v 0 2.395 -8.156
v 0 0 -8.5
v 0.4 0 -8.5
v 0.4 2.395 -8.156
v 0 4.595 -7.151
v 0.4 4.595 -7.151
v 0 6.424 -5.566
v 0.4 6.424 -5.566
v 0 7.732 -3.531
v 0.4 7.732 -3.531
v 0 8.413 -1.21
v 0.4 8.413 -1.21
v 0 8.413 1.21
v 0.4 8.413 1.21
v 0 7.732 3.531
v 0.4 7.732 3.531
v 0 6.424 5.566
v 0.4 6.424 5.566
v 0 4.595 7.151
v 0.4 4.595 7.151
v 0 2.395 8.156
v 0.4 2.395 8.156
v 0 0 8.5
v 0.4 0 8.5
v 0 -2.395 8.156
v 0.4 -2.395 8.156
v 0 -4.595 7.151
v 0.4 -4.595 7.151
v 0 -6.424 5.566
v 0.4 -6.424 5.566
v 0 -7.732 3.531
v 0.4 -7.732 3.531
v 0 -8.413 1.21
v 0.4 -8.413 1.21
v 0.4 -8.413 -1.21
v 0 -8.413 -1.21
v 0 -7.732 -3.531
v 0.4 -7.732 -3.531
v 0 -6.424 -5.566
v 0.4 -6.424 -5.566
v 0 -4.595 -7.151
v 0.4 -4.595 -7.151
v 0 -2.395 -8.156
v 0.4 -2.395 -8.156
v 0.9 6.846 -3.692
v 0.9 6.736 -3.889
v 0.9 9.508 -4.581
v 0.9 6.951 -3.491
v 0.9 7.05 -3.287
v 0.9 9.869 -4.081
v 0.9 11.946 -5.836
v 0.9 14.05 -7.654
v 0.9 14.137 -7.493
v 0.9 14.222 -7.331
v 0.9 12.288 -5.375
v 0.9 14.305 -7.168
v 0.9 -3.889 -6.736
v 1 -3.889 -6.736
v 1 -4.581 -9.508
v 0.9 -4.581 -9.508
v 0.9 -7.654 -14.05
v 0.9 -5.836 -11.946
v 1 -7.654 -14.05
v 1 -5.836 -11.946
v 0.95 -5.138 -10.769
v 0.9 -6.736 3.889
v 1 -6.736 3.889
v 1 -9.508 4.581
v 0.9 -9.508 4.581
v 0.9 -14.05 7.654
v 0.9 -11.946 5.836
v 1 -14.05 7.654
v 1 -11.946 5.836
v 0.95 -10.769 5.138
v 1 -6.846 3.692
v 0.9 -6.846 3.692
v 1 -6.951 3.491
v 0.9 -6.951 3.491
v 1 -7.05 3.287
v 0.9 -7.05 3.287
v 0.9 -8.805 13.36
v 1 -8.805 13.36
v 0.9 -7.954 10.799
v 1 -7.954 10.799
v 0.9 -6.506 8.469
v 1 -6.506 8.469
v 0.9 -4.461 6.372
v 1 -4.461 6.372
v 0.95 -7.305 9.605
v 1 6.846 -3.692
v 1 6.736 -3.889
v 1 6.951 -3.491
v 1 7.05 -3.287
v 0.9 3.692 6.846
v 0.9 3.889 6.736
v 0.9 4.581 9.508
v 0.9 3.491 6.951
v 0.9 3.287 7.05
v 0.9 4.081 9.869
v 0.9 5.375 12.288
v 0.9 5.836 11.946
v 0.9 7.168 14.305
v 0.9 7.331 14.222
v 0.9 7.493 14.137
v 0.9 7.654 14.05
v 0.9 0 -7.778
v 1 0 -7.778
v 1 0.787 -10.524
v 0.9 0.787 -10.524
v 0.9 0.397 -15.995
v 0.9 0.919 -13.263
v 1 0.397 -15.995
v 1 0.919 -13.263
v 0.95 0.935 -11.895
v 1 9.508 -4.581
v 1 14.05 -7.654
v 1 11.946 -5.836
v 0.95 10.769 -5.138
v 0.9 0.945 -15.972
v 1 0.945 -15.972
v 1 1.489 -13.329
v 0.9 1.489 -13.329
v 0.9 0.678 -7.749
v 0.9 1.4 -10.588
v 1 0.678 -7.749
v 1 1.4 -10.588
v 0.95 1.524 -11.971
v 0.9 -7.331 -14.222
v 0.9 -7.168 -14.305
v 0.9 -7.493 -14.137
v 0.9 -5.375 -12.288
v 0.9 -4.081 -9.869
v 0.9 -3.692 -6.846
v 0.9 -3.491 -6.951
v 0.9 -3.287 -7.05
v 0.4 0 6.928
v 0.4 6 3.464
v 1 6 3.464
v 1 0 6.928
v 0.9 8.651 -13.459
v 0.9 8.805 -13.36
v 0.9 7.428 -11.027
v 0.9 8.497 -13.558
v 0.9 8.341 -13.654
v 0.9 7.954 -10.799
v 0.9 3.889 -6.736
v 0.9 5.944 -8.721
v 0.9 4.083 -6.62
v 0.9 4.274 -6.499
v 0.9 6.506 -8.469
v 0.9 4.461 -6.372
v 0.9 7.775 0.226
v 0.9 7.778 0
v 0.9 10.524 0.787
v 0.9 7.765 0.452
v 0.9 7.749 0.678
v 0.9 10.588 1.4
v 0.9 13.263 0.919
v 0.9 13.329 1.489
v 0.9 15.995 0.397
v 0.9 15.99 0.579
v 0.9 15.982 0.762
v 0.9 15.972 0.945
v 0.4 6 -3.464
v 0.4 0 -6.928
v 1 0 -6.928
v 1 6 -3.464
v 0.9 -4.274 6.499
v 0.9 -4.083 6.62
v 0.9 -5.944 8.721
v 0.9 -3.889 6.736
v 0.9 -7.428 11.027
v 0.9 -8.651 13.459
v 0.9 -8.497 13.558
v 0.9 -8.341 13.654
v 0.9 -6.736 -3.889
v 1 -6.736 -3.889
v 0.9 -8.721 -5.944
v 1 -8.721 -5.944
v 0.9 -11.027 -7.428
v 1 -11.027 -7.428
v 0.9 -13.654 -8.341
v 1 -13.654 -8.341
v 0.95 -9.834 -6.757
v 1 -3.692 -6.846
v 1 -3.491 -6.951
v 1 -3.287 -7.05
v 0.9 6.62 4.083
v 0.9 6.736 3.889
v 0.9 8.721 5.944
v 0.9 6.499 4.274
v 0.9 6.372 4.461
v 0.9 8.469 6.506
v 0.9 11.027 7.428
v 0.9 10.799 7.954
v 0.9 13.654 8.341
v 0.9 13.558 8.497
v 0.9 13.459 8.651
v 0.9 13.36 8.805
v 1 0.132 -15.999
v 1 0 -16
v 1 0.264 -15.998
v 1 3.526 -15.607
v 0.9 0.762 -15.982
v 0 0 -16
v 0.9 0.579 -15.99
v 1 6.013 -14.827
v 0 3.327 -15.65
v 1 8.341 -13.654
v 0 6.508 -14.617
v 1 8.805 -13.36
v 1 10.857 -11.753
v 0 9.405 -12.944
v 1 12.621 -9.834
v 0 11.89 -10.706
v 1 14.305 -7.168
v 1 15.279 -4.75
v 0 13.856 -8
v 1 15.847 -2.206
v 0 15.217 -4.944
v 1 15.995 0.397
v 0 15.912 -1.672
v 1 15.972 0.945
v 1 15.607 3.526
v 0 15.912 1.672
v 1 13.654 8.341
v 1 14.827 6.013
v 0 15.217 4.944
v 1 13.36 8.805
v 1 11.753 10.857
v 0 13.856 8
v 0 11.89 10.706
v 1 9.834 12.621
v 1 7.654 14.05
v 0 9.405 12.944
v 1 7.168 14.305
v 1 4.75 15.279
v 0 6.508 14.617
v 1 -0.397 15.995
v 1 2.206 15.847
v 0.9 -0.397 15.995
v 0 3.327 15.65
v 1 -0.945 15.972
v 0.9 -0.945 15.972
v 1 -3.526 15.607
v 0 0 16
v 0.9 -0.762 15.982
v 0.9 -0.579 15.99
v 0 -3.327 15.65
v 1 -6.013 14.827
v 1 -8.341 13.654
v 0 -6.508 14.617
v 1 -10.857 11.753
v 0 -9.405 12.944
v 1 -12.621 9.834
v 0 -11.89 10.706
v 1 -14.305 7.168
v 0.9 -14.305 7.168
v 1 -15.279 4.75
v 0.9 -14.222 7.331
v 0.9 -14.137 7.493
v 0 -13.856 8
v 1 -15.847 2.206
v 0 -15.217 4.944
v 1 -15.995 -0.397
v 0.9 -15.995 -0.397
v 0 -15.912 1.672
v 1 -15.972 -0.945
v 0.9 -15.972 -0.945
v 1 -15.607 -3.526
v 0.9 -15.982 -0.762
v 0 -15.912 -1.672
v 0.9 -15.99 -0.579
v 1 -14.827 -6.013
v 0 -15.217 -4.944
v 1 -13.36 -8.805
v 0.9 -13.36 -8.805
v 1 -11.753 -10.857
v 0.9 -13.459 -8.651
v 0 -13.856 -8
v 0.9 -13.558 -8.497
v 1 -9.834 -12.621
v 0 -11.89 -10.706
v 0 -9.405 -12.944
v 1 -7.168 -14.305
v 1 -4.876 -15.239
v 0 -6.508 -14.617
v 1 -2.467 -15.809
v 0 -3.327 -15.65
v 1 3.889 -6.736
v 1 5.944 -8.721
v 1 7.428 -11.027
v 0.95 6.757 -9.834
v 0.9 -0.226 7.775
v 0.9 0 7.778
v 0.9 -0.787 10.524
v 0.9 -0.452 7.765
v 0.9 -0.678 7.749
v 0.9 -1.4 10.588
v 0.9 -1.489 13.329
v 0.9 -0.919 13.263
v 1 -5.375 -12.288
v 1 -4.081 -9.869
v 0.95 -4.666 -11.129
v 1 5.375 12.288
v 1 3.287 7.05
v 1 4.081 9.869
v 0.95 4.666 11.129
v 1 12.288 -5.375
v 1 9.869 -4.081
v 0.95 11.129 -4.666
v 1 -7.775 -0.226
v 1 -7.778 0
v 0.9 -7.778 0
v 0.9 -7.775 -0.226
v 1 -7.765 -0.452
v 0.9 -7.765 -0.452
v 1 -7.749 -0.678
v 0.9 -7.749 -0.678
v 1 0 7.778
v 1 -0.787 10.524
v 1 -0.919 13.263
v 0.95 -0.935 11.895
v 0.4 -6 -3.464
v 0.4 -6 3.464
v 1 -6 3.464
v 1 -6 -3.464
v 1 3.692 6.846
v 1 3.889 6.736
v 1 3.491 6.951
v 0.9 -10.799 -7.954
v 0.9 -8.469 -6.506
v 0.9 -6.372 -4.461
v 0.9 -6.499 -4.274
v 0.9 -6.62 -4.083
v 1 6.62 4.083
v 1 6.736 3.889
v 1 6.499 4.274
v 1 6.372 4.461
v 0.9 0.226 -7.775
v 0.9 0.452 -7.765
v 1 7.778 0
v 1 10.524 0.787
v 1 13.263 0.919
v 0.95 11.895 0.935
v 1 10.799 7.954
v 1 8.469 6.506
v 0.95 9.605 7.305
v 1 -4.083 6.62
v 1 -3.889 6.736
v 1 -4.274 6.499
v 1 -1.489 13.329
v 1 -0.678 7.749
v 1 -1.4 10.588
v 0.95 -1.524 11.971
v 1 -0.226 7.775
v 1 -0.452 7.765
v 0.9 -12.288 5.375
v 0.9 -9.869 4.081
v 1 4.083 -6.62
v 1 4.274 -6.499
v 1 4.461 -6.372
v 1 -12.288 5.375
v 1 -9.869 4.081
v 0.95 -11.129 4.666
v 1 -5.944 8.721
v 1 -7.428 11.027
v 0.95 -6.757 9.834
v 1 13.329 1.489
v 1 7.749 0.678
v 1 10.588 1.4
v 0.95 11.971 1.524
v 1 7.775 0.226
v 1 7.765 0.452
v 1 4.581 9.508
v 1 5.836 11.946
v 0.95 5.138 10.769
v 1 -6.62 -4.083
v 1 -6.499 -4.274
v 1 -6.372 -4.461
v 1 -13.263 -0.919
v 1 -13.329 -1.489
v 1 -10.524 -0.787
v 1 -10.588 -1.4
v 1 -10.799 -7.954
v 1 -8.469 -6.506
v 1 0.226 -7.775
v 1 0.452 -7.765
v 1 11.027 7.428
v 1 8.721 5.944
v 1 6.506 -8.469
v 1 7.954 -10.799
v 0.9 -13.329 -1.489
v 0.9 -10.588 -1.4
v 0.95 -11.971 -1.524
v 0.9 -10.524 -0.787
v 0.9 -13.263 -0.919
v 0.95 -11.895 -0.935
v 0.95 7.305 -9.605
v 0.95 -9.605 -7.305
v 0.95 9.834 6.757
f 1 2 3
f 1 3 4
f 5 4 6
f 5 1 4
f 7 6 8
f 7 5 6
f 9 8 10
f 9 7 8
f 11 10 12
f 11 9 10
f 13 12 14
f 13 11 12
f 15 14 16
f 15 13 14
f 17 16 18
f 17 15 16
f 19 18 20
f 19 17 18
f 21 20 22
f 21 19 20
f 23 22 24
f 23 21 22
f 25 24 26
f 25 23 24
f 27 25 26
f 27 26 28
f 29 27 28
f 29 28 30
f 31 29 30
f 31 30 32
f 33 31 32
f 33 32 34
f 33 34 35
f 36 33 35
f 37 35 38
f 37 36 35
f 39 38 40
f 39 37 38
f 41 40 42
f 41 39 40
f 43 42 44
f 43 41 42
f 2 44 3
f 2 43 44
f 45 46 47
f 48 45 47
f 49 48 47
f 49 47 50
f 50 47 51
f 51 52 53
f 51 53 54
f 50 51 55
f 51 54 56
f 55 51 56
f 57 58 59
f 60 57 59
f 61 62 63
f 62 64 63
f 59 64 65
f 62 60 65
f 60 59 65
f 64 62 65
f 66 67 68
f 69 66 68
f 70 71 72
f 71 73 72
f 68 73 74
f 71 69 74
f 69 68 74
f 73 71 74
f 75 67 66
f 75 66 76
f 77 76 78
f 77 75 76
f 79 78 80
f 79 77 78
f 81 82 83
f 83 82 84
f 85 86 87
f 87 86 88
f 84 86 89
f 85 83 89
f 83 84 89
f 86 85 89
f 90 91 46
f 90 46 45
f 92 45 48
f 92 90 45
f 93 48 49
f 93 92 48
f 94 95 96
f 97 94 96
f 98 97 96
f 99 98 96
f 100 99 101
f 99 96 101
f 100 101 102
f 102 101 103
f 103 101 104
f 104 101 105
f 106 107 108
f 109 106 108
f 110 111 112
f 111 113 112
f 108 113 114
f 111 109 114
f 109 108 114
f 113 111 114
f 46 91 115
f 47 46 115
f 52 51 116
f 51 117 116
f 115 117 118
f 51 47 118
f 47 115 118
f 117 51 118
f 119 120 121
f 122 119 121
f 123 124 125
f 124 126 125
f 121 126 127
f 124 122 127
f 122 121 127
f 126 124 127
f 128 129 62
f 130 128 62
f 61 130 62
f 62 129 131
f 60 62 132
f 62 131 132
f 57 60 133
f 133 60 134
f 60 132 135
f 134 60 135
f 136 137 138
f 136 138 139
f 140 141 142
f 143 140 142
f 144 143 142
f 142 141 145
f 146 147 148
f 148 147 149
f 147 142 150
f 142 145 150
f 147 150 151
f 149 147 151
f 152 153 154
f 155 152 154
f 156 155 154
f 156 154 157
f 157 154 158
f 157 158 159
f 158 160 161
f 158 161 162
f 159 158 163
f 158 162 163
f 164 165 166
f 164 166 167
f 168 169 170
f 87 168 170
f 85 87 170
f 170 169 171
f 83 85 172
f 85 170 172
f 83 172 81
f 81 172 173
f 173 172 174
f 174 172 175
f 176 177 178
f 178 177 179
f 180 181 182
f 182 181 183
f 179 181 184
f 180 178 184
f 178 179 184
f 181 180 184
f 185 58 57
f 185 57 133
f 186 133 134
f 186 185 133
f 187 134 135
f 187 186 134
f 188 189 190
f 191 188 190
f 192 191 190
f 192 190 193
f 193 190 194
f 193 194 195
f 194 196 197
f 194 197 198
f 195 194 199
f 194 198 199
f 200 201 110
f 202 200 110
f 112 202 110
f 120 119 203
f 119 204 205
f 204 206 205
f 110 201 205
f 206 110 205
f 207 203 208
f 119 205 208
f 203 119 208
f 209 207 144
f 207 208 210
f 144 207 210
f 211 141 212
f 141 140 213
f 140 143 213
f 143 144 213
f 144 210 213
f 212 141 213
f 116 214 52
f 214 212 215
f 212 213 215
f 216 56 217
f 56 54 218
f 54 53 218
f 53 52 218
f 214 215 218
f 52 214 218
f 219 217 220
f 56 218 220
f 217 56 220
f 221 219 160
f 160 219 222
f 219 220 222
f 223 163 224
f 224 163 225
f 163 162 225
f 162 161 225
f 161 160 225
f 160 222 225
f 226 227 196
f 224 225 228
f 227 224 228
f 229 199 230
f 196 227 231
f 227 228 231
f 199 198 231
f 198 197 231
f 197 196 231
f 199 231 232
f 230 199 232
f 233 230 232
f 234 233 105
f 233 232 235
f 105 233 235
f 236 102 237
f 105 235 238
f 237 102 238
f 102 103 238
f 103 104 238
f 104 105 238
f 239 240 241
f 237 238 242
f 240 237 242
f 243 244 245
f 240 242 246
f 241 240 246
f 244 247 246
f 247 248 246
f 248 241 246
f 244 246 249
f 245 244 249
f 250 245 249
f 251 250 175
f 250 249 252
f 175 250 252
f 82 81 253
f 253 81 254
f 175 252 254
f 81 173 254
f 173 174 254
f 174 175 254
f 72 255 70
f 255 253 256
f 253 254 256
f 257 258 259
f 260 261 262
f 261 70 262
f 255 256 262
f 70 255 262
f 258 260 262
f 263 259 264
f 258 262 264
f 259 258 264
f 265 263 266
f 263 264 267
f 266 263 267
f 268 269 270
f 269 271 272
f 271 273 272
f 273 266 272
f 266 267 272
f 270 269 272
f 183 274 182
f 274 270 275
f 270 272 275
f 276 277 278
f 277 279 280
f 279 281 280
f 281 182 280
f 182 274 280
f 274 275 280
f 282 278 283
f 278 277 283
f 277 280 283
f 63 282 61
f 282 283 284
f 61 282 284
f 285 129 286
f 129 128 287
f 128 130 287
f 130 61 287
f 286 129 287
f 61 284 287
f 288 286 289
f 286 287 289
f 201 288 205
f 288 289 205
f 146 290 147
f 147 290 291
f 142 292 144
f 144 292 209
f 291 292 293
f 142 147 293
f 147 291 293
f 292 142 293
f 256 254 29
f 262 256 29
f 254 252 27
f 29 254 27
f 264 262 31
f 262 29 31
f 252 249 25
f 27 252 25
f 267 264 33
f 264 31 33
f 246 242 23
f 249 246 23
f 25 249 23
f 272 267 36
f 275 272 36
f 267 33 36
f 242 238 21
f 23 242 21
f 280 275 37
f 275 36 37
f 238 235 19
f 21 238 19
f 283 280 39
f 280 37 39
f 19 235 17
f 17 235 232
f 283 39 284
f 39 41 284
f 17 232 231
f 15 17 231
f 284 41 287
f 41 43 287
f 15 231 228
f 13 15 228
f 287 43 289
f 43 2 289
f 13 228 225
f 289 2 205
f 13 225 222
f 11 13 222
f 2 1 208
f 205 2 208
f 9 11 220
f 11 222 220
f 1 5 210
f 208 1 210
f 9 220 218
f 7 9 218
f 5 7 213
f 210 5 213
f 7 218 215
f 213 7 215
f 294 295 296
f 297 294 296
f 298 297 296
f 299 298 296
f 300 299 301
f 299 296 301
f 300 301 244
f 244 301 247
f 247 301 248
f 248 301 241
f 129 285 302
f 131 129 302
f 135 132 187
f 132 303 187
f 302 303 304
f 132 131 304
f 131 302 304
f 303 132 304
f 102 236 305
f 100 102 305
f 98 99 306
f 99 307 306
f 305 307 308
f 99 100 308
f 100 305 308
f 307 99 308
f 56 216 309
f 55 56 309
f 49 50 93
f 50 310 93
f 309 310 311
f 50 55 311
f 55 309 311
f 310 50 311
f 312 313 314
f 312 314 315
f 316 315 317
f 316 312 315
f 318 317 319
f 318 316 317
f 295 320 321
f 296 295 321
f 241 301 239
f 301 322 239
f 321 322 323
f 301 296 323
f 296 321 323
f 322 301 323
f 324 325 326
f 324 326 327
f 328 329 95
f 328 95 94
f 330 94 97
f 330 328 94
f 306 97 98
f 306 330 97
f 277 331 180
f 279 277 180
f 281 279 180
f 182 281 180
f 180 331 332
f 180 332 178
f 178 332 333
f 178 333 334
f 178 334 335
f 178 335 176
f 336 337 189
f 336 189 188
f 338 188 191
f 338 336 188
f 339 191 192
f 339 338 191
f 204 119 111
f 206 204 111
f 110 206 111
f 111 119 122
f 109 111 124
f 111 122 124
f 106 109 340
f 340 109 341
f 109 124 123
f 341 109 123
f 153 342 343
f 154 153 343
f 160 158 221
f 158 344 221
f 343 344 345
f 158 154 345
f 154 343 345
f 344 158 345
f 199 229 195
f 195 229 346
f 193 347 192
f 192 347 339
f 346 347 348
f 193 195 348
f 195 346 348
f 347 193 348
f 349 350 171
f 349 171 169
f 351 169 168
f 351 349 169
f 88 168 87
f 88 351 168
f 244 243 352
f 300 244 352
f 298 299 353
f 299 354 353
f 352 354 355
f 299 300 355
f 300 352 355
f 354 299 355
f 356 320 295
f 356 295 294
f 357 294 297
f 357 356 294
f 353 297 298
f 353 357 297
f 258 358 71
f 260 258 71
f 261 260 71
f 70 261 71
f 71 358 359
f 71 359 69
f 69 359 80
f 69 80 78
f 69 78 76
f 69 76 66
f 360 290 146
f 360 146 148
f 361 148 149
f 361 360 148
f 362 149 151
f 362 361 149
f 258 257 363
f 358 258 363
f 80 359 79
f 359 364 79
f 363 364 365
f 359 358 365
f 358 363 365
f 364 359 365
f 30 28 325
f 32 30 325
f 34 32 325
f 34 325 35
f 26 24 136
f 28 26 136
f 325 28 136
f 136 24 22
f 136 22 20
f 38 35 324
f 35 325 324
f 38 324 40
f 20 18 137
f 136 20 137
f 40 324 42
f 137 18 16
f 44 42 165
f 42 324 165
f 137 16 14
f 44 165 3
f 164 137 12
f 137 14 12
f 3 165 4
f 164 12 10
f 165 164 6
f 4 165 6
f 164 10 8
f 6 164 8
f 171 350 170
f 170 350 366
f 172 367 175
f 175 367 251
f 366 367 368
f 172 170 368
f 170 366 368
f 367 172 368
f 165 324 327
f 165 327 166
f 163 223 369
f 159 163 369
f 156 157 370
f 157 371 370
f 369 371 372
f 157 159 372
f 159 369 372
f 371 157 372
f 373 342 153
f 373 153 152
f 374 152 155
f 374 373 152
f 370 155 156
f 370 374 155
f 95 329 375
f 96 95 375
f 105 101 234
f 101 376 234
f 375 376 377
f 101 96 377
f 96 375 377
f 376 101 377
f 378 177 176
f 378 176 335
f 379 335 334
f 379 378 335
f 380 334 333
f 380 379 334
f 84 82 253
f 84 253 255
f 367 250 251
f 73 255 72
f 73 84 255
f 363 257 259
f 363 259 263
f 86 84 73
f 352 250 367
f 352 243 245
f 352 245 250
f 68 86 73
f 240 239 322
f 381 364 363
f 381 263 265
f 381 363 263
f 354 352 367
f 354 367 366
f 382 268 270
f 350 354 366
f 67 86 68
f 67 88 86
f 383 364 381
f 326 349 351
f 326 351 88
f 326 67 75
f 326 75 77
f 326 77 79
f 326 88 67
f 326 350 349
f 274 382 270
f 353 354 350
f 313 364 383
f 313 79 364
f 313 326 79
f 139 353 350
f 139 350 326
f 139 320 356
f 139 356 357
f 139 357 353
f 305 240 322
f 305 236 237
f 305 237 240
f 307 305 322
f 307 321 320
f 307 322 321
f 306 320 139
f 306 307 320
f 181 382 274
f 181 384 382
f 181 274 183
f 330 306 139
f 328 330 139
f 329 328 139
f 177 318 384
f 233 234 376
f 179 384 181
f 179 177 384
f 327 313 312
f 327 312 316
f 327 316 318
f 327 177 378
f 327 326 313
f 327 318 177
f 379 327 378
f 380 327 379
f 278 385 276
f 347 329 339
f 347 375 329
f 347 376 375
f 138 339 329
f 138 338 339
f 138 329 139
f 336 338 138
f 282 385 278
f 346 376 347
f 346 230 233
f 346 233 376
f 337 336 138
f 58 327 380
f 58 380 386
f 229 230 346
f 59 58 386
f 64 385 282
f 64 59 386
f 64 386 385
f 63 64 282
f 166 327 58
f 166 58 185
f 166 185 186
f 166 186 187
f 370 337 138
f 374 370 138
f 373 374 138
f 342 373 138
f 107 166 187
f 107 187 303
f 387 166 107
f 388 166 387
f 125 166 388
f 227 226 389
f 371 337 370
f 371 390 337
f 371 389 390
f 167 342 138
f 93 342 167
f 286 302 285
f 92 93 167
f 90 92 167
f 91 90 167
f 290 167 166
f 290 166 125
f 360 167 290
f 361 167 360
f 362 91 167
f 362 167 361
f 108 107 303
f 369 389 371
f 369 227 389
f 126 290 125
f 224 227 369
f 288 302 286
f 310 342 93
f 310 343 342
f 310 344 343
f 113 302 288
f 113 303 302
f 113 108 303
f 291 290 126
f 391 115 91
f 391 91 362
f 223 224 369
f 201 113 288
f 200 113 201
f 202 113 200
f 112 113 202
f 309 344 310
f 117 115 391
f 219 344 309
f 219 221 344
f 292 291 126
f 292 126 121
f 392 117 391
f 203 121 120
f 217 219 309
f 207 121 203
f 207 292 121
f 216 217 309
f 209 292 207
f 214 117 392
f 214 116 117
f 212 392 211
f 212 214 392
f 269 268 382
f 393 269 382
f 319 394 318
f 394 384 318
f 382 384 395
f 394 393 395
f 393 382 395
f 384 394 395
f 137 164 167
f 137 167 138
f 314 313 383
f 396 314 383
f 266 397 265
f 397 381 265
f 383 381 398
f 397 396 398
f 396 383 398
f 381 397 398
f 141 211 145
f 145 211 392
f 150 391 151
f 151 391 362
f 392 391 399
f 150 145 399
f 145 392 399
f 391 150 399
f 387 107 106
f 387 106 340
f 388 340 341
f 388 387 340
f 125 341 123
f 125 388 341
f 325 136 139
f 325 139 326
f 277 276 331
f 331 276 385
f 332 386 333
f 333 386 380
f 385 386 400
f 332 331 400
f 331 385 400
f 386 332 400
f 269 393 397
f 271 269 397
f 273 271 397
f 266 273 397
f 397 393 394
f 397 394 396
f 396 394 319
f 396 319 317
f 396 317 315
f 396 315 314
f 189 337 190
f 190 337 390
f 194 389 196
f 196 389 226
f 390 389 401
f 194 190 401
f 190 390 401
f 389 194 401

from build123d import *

# Parameters (mm, degrees)
SKETCH1_R           = 16
BOSS_EXTRUDE1_DEPTH = 1
SKETCH1_3_R         = 8.5
CUT_EXTRUDE1_DEPTH  = 0.4
CUT_EXTRUDE2_DEPTH  = 0.1


with BuildPart() as part:
    # Sketch1 → Boss-Extrude1 (new body)
    with BuildSketch(Plane(origin=(0, 0, 0), x_dir=(0, 0, -1), z_dir=(1, 0, 0))):
        Circle(SKETCH1_R)
        Polygon((6.92820323, 0), (3.464101615, -6), (-3.464101615, -6), (-6.92820323, 0), (-3.464101615, 6), (3.464101615, 6), align=None, mode=Mode.SUBTRACT)
    extrude(amount=BOSS_EXTRUDE1_DEPTH)

    # Sketch1<3> → Cut-Extrude1 (cut)
    with BuildSketch(Plane(origin=(0, 0, 0), x_dir=(0, 0, -1), z_dir=(1, 0, 0))):
        Circle(SKETCH1_3_R)
        Polygon((3.464101615, 6), (6.92820323, 0), (3.464101615, -6), (-3.464101615, -6), (-6.92820323, 0), (-3.464101615, 6), align=None, mode=Mode.SUBTRACT)
    extrude(amount=CUT_EXTRUDE1_DEPTH, mode=Mode.SUBTRACT)

    # Sketch2 → Cut-Extrude2 (cut)
    with BuildSketch(Plane(origin=(1, 0, 0), x_dir=(0, 0, -1), z_dir=(1, 0, 0))):
        with BuildLine():
            ThreePointArc((0, 7.778308753), (-0.339285063, 7.770905526), (-0.677924277, 7.74870994))
            add(Edge.make_bspline(
                [(-0.88309199, 16.154115956), (-2.272109381, 12.182110552), (-0.677924277, 7.74870994)],
                knots=[0, 0, 0, 1, 1, 1], degree=2))
            ThreePointArc((-0.88309199, 16.154115956), (-0.611192857, 16.166686645), (-0.33912072, 16.174681169))
            add(Edge.make_bspline(
                [(0, 7.778308753), (-1.708704101, 11.993417261), (-0.33912072, 16.174681169)],
                knots=[0, 0, 0, 1, 1, 1], degree=2))
        make_face()
        with BuildLine():
            ThreePointArc((3.889154376, 6.736212978), (3.59162328, 6.899444127), (3.287255324, 7.049541793))
            add(Edge.make_bspline(
                [(7.312277881, 14.431420789), (4.123350831, 11.6860719), (3.287255324, 7.049541793)],
                knots=[0, 0, 0, 1, 1, 1], degree=2))
            ThreePointArc((7.312277881, 14.431420789), (7.554034782, 14.306357758), (7.793653427, 14.177245151))
            add(Edge.make_bspline(
                [(3.889154376, 6.736212978), (4.516927471, 11.240956077), (7.793653427, 14.177245151)],
                knots=[0, 0, 0, 1, 1, 1], degree=2))
        make_face()
        with BuildLine():
            ThreePointArc((6.736212978, 3.889154376), (6.560159065, 4.179282246), (6.371617516, 4.461454615))
            add(Edge.make_bspline(
                [(13.548328799, 8.841838075), (9.413962519, 8.05875972), (6.371617516, 4.461454615)],
                knots=[0, 0, 0, 1, 1, 1], degree=2))
            ThreePointArc((13.548328799, 8.841838075), (13.695164901, 8.612651864), (13.838124431, 8.381027743))
            add(Edge.make_bspline(
                [(6.736212978, 3.889154376), (9.532251976, 7.47648979), (13.838124431, 8.381027743)],
                knots=[0, 0, 0, 1, 1, 1], degree=2))
        make_face()
        with BuildLine():
            ThreePointArc((7.778308753, 0), (7.770905526, 0.339285063), (7.74870994, 0.677924277))
            add(Edge.make_bspline(
                [(16.154115956, 0.88309199), (12.182110552, 2.272109381), (7.74870994, 0.677924277)],
                knots=[0, 0, 0, 1, 1, 1], degree=2))
            ThreePointArc((16.154115956, 0.88309199), (16.166686645, 0.611192857), (16.174681169, 0.33912072))
            add(Edge.make_bspline(
                [(7.778308753, 0), (11.993417261, 1.708704101), (16.174681169, 0.33912072)],
                knots=[0, 0, 0, 1, 1, 1], degree=2))
        make_face()
        with BuildLine():
            ThreePointArc((6.736212978, -3.889154376), (6.899444127, -3.59162328), (7.049541793, -3.287255324))
            add(Edge.make_bspline(
                [(14.431420789, -7.312277881), (11.6860719, -4.123350831), (7.049541793, -3.287255324)],
                knots=[0, 0, 0, 1, 1, 1], degree=2))
            ThreePointArc((14.431420789, -7.312277881), (14.306357758, -7.554034782), (14.177245151, -7.793653427))
            add(Edge.make_bspline(
                [(6.736212978, -3.889154376), (11.240956077, -4.516927471), (14.177245151, -7.793653427)],
                knots=[0, 0, 0, 1, 1, 1], degree=2))
        make_face()
        with BuildLine():
            ThreePointArc((3.889154376, -6.736212978), (4.179282246, -6.560159065), (4.461454615, -6.371617516))
            add(Edge.make_bspline(
                [(8.841838075, -13.548328799), (8.05875972, -9.413962519), (4.461454615, -6.371617516)],
                knots=[0, 0, 0, 1, 1, 1], degree=2))
            ThreePointArc((8.841838075, -13.548328799), (8.612651864, -13.695164901), (8.381027743, -13.838124431))
            add(Edge.make_bspline(
                [(3.889154376, -6.736212978), (7.47648979, -9.532251976), (8.381027743, -13.838124431)],
                knots=[0, 0, 0, 1, 1, 1], degree=2))
        make_face()
        with BuildLine():
            ThreePointArc((0, -7.778308753), (0.339285063, -7.770905526), (0.677924277, -7.74870994))
            add(Edge.make_bspline(
                [(0.88309199, -16.154115956), (2.272109381, -12.182110552), (0.677924277, -7.74870994)],
                knots=[0, 0, 0, 1, 1, 1], degree=2))
            ThreePointArc((0.88309199, -16.154115956), (0.611192857, -16.166686645), (0.33912072, -16.174681169))
            add(Edge.make_bspline(
                [(0, -7.778308753), (1.708704101, -11.993417261), (0.33912072, -16.174681169)],
                knots=[0, 0, 0, 1, 1, 1], degree=2))
        make_face()
        with BuildLine():
            ThreePointArc((-3.889154376, -6.736212978), (-3.59162328, -6.899444127), (-3.287255324, -7.049541793))
            add(Edge.make_bspline(
                [(-7.312277881, -14.431420789), (-4.123350831, -11.6860719), (-3.287255324, -7.049541793)],
                knots=[0, 0, 0, 1, 1, 1], degree=2))
            ThreePointArc((-7.312277881, -14.431420789), (-7.554034782, -14.306357758), (-7.793653427, -14.177245151))
            add(Edge.make_bspline(
                [(-3.889154376, -6.736212978), (-4.516927471, -11.240956077), (-7.793653427, -14.177245151)],
                knots=[0, 0, 0, 1, 1, 1], degree=2))
        make_face()
        with BuildLine():
            ThreePointArc((-6.736212978, -3.889154376), (-6.560159065, -4.179282246), (-6.371617516, -4.461454615))
            add(Edge.make_bspline(
                [(-13.548328799, -8.841838075), (-9.413962519, -8.05875972), (-6.371617516, -4.461454615)],
                knots=[0, 0, 0, 1, 1, 1], degree=2))
            ThreePointArc((-13.548328799, -8.841838075), (-13.695164901, -8.612651864), (-13.838124431, -8.381027743))
            add(Edge.make_bspline(
                [(-6.736212978, -3.889154376), (-9.532251976, -7.47648979), (-13.838124431, -8.381027743)],
                knots=[0, 0, 0, 1, 1, 1], degree=2))
        make_face()
        with BuildLine():
            ThreePointArc((-7.778308753, 0), (-7.770905526, -0.339285063), (-7.74870994, -0.677924277))
            add(Edge.make_bspline(
                [(-16.154115956, -0.88309199), (-12.182110552, -2.272109381), (-7.74870994, -0.677924277)],
                knots=[0, 0, 0, 1, 1, 1], degree=2))
            ThreePointArc((-16.154115956, -0.88309199), (-16.166686645, -0.611192857), (-16.174681169, -0.33912072))
            add(Edge.make_bspline(
                [(-7.778308753, 0), (-11.993417261, -1.708704101), (-16.174681169, -0.33912072)],
                knots=[0, 0, 0, 1, 1, 1], degree=2))
        make_face()
        with BuildLine():
            ThreePointArc((-6.736212978, 3.889154376), (-6.899444127, 3.59162328), (-7.049541793, 3.287255324))
            add(Edge.make_bspline(
                [(-14.431420789, 7.312277881), (-11.6860719, 4.123350831), (-7.049541793, 3.287255324)],
                knots=[0, 0, 0, 1, 1, 1], degree=2))
            ThreePointArc((-14.431420789, 7.312277881), (-14.306357758, 7.554034782), (-14.177245151, 7.793653427))
            add(Edge.make_bspline(
                [(-6.736212978, 3.889154376), (-11.240956077, 4.516927471), (-14.177245151, 7.793653427)],
                knots=[0, 0, 0, 1, 1, 1], degree=2))
        make_face()
        with BuildLine():
            ThreePointArc((-3.889154376, 6.736212978), (-4.179282246, 6.560159065), (-4.461454615, 6.371617516))
            add(Edge.make_bspline(
                [(-8.841838075, 13.548328799), (-8.05875972, 9.413962519), (-4.461454615, 6.371617516)],
                knots=[0, 0, 0, 1, 1, 1], degree=2))
            ThreePointArc((-8.841838075, 13.548328799), (-8.612651864, 13.695164901), (-8.381027743, 13.838124431))
            add(Edge.make_bspline(
                [(-3.889154376, 6.736212978), (-7.47648979, 9.532251976), (-8.381027743, 13.838124431)],
                knots=[0, 0, 0, 1, 1, 1], degree=2))
        make_face()
    extrude(amount=-CUT_EXTRUDE2_DEPTH, mode=Mode.SUBTRACT)


solid = part.part
